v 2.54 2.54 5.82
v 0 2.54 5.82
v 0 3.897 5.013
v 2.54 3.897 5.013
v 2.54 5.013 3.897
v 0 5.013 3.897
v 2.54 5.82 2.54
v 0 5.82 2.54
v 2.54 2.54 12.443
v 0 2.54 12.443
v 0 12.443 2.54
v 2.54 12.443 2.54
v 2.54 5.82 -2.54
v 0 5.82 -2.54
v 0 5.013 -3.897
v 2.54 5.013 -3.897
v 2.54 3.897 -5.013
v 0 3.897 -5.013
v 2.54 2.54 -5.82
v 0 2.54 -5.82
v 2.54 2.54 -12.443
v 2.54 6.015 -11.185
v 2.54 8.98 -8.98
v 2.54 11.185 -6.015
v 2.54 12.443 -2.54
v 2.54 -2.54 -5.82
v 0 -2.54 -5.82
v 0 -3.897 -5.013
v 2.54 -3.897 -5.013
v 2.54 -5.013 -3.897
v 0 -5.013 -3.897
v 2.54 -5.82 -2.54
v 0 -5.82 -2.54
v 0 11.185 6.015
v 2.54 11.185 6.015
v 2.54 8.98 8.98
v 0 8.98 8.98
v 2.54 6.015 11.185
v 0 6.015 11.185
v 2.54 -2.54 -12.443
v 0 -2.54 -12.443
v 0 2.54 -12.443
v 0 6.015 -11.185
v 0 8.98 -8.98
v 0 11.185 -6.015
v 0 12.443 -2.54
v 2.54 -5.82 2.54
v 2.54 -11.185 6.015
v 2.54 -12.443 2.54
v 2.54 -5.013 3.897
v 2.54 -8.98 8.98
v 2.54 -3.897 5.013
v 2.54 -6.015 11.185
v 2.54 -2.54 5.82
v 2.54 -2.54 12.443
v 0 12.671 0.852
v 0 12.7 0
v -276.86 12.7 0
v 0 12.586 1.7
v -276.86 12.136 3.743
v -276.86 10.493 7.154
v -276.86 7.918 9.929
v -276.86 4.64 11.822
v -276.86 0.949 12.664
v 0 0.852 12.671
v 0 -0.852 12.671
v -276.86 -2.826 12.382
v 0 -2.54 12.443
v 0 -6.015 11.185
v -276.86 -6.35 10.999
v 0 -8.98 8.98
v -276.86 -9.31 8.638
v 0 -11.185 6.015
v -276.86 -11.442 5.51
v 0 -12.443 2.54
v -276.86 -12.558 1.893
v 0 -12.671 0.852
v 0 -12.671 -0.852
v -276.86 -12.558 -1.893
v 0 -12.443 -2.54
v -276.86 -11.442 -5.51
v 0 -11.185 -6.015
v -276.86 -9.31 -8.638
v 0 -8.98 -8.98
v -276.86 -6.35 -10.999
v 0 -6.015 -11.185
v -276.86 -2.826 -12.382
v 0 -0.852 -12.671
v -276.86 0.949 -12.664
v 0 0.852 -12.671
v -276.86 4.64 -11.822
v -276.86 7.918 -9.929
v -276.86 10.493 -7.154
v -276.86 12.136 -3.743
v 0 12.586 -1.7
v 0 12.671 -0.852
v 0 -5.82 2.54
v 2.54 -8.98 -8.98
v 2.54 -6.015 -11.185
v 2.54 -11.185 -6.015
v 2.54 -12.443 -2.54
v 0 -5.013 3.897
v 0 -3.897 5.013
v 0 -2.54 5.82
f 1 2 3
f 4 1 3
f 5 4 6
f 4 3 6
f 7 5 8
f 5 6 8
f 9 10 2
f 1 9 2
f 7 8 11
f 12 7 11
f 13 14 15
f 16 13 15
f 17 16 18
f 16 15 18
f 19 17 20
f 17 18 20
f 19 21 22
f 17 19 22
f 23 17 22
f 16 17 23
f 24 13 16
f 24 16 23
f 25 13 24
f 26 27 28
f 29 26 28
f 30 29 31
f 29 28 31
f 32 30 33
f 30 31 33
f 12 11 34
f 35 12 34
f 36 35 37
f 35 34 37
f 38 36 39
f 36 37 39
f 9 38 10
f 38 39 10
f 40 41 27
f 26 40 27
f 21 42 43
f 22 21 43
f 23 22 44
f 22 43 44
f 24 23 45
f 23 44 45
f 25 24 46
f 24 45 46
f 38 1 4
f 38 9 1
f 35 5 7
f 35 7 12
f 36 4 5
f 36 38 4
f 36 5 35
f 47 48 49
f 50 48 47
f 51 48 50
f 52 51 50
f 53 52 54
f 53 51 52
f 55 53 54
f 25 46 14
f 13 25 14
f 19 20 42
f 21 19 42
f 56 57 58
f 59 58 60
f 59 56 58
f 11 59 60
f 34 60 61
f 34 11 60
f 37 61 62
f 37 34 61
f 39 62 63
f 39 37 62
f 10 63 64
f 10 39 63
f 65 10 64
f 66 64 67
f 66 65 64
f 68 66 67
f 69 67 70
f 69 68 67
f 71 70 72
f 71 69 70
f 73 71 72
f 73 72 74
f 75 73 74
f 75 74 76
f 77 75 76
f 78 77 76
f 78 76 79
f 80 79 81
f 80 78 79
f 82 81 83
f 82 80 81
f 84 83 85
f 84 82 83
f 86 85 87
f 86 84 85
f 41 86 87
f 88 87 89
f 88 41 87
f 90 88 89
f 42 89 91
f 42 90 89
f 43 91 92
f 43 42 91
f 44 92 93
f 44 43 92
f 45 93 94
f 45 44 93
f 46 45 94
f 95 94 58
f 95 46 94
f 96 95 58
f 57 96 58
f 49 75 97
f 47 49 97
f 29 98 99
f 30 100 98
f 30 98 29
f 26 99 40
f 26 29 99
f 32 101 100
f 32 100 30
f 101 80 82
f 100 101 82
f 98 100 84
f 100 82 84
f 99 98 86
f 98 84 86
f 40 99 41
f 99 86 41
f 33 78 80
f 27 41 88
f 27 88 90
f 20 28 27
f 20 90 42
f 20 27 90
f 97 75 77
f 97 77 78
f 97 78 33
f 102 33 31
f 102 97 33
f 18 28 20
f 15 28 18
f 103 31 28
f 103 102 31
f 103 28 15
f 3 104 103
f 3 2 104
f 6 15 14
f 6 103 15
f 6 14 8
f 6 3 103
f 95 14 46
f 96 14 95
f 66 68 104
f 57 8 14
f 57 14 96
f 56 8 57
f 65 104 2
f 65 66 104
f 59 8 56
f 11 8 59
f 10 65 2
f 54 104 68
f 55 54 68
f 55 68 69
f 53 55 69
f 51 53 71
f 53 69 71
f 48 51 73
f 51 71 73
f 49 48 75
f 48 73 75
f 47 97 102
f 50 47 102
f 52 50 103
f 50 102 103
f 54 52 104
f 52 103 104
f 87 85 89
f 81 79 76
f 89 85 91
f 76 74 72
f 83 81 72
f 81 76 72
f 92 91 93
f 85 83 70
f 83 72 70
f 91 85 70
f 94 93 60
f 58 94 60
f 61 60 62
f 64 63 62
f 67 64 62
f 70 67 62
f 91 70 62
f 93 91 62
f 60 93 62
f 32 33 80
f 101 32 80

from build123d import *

# Parameters (mm, degrees)
F0_R     = 12.7
F1_DEPTH = 276.86
F3_DEPTH = 2.54


# Not quite as in the source:
# - after a boolean that leaves OpenCascade's solid faulty, fix() repairs it


with BuildPart() as f1:
    # F0 (on Right) → F1 (new body)
    with BuildSketch(Plane.YZ):
        Circle(F0_R)
    extrude(amount=-F1_DEPTH)

    # F2 (on face) → F3 (join)
    with BuildSketch(Plane.YZ):
        with BuildLine():
            ThreePointArc((-5.8198711326, 2.54), (-4.4901280605, 4.4901280605), (-2.54, 5.8198711326))
            Line((-2.54, 5.8198711326), (-2.54, 12.4434078933))
            ThreePointArc((-2.54, 12.4434078933), (-8.9802561211, 8.9802561211), (-12.4434078933, 2.54))
            Line((-12.4434078933, 2.54), (-5.8198711326, 2.54))
        make_face()
        with BuildLine():
            ThreePointArc((2.54, 5.8198711326), (4.4901280605, 4.4901280605), (5.8198711326, 2.54))
            Line((5.8198711326, 2.54), (12.4434078933, 2.54))
            ThreePointArc((12.4434078933, 2.54), (8.9802561211, 8.9802561211), (2.54, 12.4434078933))
            Line((2.54, 12.4434078933), (2.54, 5.8198711326))
        make_face()
        with BuildLine():
            Line((12.4434078933, -2.54), (5.8198711326, -2.54))
            ThreePointArc((5.8198711326, -2.54), (4.4901280605, -4.4901280605), (2.54, -5.8198711326))
            Line((2.54, -5.8198711326), (2.54, -12.4434078933))
            ThreePointArc((2.54, -12.4434078933), (8.9802561211, -8.9802561211), (12.4434078933, -2.54))
        make_face()
        with BuildLine():
            Line((-2.54, -12.4434078933), (-2.54, -5.8198711326))
            ThreePointArc((-2.54, -5.8198711326), (-4.4901280605, -4.4901280605), (-5.8198711326, -2.54))
            Line((-5.8198711326, -2.54), (-12.4434078933, -2.54))
            ThreePointArc((-12.4434078933, -2.54), (-8.9802561211, -8.9802561211), (-2.54, -12.4434078933))
        make_face()
    extrude(amount=F3_DEPTH)

    add(f1.part.fix(), mode=Mode.REPLACE)


solid = f1.part
